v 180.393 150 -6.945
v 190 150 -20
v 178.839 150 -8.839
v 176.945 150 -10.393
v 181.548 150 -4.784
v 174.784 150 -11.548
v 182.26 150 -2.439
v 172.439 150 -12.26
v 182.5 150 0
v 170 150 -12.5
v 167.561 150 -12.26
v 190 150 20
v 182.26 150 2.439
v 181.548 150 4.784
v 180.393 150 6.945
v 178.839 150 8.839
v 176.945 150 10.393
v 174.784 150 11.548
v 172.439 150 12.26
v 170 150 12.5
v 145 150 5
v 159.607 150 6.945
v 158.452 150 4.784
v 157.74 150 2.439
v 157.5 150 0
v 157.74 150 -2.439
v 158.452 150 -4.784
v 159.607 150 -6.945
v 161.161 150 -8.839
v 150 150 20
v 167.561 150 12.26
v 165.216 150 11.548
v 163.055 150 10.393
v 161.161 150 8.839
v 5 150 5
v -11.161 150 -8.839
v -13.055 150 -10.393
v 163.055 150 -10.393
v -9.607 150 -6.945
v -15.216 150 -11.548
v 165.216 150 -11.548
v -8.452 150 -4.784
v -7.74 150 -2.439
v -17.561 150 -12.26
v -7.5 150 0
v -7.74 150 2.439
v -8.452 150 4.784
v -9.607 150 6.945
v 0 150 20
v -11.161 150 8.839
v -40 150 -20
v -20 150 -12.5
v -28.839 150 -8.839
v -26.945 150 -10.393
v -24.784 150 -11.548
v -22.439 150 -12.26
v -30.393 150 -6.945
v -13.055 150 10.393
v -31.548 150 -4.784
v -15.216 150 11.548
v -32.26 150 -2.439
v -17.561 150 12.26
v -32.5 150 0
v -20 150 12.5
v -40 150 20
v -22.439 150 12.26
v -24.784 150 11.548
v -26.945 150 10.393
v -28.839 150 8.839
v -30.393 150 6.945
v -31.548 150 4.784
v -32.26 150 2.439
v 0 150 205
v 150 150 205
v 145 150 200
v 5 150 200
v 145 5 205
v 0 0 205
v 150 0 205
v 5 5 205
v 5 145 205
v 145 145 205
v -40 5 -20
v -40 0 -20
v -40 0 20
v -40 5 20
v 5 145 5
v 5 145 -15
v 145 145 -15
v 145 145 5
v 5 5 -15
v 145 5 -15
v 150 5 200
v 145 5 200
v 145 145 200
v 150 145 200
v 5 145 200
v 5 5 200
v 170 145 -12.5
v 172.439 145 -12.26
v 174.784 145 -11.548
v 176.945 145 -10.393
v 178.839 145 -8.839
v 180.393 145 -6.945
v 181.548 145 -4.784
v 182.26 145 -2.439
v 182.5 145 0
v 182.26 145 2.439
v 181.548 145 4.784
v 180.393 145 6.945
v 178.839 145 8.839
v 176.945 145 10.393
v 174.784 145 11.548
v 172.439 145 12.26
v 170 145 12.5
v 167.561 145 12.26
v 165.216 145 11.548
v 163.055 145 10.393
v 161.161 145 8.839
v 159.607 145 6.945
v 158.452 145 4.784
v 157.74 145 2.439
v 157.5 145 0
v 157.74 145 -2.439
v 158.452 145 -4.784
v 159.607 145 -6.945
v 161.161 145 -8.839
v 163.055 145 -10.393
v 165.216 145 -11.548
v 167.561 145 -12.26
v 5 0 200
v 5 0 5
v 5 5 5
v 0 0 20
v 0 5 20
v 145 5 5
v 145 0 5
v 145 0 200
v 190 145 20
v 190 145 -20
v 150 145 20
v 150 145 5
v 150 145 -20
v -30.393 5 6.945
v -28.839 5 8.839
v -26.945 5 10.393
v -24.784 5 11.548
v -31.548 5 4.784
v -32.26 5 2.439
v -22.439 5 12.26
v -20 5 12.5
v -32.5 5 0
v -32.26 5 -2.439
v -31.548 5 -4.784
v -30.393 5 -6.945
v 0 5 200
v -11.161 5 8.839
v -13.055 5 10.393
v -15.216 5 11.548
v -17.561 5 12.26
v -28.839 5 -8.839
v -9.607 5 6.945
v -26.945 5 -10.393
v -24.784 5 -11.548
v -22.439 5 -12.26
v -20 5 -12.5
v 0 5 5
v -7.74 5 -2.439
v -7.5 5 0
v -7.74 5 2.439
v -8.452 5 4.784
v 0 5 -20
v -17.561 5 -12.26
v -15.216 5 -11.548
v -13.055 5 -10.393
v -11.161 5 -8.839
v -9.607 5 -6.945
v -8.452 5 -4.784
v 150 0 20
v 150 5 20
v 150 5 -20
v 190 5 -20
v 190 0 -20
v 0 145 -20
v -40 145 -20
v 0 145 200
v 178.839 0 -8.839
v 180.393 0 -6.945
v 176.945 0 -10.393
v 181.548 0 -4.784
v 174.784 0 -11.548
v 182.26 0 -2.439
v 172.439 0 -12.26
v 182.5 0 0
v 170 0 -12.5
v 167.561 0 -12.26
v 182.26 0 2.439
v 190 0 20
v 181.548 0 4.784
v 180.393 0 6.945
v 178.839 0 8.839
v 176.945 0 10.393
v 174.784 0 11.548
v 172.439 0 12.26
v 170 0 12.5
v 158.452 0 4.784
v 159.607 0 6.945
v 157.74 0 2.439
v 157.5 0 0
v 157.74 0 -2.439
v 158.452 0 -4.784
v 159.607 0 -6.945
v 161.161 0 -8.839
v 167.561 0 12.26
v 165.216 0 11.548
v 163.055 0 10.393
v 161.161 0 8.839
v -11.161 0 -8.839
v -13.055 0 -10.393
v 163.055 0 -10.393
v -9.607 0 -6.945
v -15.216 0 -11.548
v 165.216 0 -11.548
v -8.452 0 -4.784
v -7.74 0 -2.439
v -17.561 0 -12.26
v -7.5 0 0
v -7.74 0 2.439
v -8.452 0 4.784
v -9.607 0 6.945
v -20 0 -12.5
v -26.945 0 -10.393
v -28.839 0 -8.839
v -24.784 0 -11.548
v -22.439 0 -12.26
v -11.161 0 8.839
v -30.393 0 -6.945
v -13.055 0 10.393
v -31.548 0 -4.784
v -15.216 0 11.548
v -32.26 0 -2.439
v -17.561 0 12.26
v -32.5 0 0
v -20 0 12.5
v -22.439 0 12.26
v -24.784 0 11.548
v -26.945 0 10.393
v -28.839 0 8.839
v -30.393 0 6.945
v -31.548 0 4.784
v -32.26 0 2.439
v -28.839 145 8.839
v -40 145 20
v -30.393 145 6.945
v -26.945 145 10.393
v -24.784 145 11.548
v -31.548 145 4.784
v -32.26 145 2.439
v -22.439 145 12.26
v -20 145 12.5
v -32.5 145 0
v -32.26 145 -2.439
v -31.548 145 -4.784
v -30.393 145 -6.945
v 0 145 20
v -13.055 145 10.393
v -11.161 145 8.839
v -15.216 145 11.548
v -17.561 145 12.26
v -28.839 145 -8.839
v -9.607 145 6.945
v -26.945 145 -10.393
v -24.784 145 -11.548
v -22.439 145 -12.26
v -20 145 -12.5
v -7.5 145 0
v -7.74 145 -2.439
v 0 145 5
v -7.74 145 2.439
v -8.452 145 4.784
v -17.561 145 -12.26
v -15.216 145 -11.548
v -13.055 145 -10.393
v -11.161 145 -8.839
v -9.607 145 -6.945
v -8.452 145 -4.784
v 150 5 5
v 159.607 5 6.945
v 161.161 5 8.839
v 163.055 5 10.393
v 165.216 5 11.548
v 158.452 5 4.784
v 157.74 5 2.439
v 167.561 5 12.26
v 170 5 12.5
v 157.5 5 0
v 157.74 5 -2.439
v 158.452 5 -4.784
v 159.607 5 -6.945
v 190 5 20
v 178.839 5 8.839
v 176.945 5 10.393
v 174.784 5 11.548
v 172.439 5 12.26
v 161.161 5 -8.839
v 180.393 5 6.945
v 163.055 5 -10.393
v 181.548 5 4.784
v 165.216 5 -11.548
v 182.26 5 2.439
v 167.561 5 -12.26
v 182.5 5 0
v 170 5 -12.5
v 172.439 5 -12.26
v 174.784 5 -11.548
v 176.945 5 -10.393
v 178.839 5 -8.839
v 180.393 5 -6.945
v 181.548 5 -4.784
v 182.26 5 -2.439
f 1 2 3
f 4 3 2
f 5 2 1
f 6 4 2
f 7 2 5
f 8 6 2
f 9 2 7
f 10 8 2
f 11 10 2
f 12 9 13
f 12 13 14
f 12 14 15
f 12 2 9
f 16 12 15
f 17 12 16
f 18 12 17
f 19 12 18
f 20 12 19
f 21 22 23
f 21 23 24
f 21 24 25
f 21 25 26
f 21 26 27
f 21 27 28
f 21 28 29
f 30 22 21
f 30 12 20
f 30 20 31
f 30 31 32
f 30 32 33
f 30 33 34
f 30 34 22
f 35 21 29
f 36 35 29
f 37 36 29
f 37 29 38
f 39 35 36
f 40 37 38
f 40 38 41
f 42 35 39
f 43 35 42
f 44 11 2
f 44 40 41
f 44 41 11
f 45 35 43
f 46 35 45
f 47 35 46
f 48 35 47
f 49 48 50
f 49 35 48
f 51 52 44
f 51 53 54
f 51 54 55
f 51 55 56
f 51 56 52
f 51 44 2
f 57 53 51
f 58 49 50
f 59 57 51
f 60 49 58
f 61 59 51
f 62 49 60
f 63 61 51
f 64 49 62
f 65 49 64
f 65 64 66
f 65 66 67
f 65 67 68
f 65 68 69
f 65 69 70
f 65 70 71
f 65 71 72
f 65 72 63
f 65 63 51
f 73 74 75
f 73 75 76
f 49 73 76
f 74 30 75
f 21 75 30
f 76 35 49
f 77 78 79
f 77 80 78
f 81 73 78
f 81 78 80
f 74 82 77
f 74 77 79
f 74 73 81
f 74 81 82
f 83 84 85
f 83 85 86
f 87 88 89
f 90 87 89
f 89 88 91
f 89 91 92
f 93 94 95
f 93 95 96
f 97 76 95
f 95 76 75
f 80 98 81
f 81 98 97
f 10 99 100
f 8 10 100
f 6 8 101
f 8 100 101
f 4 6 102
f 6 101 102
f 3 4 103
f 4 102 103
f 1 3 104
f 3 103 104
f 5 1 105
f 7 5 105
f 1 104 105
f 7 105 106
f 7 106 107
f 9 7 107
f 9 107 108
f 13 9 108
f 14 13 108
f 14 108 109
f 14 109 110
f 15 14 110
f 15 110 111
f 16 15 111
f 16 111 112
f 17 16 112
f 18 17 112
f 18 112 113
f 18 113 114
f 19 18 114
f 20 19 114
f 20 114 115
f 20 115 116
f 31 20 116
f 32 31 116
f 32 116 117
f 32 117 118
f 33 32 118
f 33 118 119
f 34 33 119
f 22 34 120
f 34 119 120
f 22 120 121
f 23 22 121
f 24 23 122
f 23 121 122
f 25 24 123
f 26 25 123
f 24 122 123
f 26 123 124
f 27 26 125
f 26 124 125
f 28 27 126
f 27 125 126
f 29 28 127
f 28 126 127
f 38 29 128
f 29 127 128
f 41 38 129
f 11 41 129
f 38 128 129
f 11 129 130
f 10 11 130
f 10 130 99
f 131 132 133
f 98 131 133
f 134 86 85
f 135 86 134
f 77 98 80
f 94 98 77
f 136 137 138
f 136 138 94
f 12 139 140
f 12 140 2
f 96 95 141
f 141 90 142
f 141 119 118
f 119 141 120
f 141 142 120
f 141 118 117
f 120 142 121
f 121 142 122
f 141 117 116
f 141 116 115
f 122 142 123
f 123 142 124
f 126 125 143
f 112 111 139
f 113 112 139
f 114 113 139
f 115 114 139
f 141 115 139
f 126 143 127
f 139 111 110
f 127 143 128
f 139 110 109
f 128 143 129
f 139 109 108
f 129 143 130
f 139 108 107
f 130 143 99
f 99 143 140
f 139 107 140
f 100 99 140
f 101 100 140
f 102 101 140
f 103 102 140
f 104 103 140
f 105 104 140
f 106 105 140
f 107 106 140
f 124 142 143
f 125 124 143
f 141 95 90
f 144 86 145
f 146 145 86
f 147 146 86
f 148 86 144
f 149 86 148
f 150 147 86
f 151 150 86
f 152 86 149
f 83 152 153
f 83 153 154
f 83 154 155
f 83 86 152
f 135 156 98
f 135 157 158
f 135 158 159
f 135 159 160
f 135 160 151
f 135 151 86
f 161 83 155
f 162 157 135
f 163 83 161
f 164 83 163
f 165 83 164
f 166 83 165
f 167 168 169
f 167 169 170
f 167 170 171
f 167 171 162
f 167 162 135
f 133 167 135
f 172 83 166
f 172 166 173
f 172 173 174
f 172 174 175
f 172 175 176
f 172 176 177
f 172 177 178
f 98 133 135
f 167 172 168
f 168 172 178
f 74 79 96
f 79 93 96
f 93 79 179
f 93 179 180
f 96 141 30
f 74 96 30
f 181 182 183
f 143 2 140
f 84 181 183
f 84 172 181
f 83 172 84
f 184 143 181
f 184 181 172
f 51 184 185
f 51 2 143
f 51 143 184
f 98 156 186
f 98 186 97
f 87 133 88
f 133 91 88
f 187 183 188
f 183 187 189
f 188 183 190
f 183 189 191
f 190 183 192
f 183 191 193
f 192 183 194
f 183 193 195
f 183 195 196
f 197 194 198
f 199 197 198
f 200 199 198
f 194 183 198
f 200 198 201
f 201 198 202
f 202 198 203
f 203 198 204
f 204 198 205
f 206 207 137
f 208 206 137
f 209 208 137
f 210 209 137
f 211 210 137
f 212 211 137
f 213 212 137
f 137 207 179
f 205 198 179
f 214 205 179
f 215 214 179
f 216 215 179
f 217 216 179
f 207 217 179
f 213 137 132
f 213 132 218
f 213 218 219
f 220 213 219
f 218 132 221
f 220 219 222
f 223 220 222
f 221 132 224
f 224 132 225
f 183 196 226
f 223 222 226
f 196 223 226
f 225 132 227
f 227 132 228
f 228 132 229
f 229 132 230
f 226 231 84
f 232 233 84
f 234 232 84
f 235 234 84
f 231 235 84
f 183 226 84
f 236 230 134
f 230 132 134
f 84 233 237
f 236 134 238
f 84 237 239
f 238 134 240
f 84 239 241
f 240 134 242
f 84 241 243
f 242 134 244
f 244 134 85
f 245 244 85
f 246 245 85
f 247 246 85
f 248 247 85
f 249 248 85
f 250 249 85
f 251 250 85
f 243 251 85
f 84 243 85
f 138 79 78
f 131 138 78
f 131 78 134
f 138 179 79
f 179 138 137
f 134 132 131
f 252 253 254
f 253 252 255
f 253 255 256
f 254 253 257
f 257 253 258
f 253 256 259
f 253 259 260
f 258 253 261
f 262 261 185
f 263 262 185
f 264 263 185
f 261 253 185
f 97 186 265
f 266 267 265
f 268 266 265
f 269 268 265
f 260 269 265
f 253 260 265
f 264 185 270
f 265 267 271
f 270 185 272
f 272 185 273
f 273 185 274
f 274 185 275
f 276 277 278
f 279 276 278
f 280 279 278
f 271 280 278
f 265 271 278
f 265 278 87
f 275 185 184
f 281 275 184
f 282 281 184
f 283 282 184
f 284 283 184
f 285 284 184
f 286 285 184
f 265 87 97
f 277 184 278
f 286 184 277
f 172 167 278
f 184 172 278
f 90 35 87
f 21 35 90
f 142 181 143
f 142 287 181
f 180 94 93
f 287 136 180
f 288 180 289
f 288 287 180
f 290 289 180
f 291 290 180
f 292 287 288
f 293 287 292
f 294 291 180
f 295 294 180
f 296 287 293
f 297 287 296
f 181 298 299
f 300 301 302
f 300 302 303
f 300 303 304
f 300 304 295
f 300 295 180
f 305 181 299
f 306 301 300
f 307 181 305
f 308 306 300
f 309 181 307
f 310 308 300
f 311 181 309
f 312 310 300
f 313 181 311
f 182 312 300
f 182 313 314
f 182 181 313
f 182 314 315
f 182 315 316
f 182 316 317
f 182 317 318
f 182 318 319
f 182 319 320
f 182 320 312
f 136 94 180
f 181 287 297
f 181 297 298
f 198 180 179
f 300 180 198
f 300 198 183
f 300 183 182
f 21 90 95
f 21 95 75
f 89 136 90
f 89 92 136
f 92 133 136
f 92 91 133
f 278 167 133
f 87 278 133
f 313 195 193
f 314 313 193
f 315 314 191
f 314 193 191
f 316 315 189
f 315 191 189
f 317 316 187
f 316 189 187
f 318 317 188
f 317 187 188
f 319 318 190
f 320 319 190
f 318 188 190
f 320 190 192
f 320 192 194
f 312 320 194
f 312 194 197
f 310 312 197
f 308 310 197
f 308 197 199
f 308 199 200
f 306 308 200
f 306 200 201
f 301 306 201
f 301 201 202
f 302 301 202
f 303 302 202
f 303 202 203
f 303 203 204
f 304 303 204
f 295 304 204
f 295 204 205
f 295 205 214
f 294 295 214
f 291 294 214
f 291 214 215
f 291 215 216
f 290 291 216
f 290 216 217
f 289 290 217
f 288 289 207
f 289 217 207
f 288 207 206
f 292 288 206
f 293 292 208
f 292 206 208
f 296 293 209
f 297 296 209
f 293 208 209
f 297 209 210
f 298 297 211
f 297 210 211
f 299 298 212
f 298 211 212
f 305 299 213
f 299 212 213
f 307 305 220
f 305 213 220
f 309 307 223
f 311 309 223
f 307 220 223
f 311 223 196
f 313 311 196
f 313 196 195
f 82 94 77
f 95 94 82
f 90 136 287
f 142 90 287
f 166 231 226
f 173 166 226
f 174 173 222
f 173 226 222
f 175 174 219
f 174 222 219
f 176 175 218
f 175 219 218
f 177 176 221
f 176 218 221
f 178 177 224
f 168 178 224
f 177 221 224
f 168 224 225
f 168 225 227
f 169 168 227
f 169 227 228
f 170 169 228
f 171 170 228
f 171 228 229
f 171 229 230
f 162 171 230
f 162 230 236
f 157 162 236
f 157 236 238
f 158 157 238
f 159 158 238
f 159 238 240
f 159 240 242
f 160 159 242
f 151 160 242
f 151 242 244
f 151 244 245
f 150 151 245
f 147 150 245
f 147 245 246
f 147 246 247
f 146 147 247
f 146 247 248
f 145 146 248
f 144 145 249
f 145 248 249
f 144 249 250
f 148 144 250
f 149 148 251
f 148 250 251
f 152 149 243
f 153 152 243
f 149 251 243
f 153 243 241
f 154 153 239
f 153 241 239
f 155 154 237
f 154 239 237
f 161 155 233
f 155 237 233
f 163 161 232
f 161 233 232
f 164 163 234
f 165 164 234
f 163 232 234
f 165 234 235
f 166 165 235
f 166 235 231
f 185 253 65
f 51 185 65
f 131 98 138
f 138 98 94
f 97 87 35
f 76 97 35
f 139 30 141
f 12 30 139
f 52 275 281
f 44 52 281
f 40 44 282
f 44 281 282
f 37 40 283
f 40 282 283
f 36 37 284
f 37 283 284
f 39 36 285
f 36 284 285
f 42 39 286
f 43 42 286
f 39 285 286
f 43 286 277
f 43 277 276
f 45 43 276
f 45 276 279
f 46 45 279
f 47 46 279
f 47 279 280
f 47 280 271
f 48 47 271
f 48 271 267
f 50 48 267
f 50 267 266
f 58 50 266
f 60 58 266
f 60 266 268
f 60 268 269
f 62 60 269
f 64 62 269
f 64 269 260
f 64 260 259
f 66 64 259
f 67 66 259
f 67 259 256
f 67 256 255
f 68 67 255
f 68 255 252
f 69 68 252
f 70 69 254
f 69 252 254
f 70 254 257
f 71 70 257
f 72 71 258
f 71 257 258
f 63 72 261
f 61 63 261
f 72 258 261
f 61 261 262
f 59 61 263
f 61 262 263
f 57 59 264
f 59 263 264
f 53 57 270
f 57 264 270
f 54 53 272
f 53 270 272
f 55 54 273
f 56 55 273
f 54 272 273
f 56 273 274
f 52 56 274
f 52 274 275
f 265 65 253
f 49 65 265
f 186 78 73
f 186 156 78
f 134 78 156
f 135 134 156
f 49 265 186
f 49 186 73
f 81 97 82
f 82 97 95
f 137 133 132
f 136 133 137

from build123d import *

# Parameters (mm, degrees)
SKETCH_1_W                  = 140
SKETCH_1_H                  = 140
EXTRUDE_2_DEPTH             = 5
SKETCH_1_4_W                = 40
SKETCH_1_4_H                = 5
EXTRUDE_3_DEPTH             = 20
SKETCH_2_R                  = 12.5
CUT_EXTRUDE_1_DEPTH         = 243.89915603
PATTERN_LINEAR_1_COUNT      = 2
PATTERN_LINEAR_1_PITCH      = 190
SKETCH_4_W                  = 5
SKETCH_4_H                  = 5
EXTRUDE_5_DEPTH             = 200
PATTERN_LINEAR_2_COUNT      = 2
PATTERN_LINEAR_2_PITCH      = 145
PATTERN_LINEAR_2_COUNT_DIR2 = 2
PATTERN_LINEAR_2_PITCH_DIR2 = 145
PATTERN_LINEAR_3_COUNT      = 2
PATTERN_LINEAR_3_PITCH      = 200
SKETCH_5_W                  = 150
SKETCH_5_H                  = 150
EXTRUDE_6_DEPTH             = 20
SKETCH_7_W                  = 140
SKETCH_7_H                  = 140
CUT_EXTRUDE_3_DEPTH         = 15


with BuildPart() as part:
    # Эскиз1 → Бобышка-Вытянуть2 (new body)
    with BuildSketch(Plane.XY):
        Polygon((150, 150), (0, 150), (0, 145), (0, 5), (0, 0), (150, 0), (150, 5), (150, 145), align=None)
        with Locations((75, 75)):
            Rectangle(SKETCH_1_W, SKETCH_1_H, mode=Mode.SUBTRACT)
    extrude_2 = extrude(amount=EXTRUDE_2_DEPTH)

    # Эскиз1<4> → Бобышка-Вытянуть3 (add, symmetric)
    with BuildSketch(Plane.XY):
        with Locations((170, 147.5)):
            Rectangle(SKETCH_1_4_W, SKETCH_1_4_H)
        with Locations((-20, 147.5)):
            Rectangle(SKETCH_1_4_W, SKETCH_1_4_H)
        with Locations((170, 2.5)):
            Rectangle(SKETCH_1_4_W, SKETCH_1_4_H)
        with Locations((-20, 2.5)):
            Rectangle(SKETCH_1_4_W, SKETCH_1_4_H)
    extrude(amount=EXTRUDE_3_DEPTH, both=True)

    # Эскиз2 → Вырез-Вытянуть1 (cut, through all)
    with BuildSketch(Plane.XZ):
        with Locations((-20, 0)):
            Circle(SKETCH_2_R)
    cut_extrude_1 = extrude(amount=-CUT_EXTRUDE_1_DEPTH, mode=Mode.SUBTRACT)

    # Линейный массив1: Вырез-Вытянуть1 ×2
    with Locations(*[(i * PATTERN_LINEAR_1_PITCH, 0, 0) for i in range(1, PATTERN_LINEAR_1_COUNT)]):
        add(cut_extrude_1, mode=Mode.SUBTRACT)

    # Эскиз4 → Бобышка-Вытянуть5 (add)
    with BuildSketch(Plane.XY.offset(5)):
        with Locations((147.5, 2.5)):
            Rectangle(SKETCH_4_W, SKETCH_4_H)
    extrude_5 = extrude(amount=EXTRUDE_5_DEPTH)

    # Линейный массив2: Extrude 5 2 × 2
    with Locations(*[(-j * PATTERN_LINEAR_2_PITCH_DIR2, i * PATTERN_LINEAR_2_PITCH, 0) for i in range(PATTERN_LINEAR_2_COUNT) for j in range(PATTERN_LINEAR_2_COUNT_DIR2) if (i, j) != (0, 0)]):
        add(extrude_5)

    # Линейный массив3: Бобышка-Вытянуть2 ×2
    with Locations(*[(0, 0, i * PATTERN_LINEAR_3_PITCH) for i in range(1, PATTERN_LINEAR_3_COUNT)]):
        add(extrude_2)

    # Эскиз5 → Бобышка-Вытянуть6 (add)
    with BuildSketch(Plane(origin=(0, 0, 0), x_dir=(-1, 0, 0), z_dir=(0, 0, -1))):
        with Locations((-75, 75)):
            Rectangle(SKETCH_5_W, SKETCH_5_H)
    extrude(amount=EXTRUDE_6_DEPTH)

    # Эскиз7 → Вырез-Вытянуть3 (cut)
    with BuildSketch(Plane.XY):
        with Locations((75, 75)):
            Rectangle(SKETCH_7_W, SKETCH_7_H)
    extrude(amount=-CUT_EXTRUDE_3_DEPTH, mode=Mode.SUBTRACT)


solid = part.part
